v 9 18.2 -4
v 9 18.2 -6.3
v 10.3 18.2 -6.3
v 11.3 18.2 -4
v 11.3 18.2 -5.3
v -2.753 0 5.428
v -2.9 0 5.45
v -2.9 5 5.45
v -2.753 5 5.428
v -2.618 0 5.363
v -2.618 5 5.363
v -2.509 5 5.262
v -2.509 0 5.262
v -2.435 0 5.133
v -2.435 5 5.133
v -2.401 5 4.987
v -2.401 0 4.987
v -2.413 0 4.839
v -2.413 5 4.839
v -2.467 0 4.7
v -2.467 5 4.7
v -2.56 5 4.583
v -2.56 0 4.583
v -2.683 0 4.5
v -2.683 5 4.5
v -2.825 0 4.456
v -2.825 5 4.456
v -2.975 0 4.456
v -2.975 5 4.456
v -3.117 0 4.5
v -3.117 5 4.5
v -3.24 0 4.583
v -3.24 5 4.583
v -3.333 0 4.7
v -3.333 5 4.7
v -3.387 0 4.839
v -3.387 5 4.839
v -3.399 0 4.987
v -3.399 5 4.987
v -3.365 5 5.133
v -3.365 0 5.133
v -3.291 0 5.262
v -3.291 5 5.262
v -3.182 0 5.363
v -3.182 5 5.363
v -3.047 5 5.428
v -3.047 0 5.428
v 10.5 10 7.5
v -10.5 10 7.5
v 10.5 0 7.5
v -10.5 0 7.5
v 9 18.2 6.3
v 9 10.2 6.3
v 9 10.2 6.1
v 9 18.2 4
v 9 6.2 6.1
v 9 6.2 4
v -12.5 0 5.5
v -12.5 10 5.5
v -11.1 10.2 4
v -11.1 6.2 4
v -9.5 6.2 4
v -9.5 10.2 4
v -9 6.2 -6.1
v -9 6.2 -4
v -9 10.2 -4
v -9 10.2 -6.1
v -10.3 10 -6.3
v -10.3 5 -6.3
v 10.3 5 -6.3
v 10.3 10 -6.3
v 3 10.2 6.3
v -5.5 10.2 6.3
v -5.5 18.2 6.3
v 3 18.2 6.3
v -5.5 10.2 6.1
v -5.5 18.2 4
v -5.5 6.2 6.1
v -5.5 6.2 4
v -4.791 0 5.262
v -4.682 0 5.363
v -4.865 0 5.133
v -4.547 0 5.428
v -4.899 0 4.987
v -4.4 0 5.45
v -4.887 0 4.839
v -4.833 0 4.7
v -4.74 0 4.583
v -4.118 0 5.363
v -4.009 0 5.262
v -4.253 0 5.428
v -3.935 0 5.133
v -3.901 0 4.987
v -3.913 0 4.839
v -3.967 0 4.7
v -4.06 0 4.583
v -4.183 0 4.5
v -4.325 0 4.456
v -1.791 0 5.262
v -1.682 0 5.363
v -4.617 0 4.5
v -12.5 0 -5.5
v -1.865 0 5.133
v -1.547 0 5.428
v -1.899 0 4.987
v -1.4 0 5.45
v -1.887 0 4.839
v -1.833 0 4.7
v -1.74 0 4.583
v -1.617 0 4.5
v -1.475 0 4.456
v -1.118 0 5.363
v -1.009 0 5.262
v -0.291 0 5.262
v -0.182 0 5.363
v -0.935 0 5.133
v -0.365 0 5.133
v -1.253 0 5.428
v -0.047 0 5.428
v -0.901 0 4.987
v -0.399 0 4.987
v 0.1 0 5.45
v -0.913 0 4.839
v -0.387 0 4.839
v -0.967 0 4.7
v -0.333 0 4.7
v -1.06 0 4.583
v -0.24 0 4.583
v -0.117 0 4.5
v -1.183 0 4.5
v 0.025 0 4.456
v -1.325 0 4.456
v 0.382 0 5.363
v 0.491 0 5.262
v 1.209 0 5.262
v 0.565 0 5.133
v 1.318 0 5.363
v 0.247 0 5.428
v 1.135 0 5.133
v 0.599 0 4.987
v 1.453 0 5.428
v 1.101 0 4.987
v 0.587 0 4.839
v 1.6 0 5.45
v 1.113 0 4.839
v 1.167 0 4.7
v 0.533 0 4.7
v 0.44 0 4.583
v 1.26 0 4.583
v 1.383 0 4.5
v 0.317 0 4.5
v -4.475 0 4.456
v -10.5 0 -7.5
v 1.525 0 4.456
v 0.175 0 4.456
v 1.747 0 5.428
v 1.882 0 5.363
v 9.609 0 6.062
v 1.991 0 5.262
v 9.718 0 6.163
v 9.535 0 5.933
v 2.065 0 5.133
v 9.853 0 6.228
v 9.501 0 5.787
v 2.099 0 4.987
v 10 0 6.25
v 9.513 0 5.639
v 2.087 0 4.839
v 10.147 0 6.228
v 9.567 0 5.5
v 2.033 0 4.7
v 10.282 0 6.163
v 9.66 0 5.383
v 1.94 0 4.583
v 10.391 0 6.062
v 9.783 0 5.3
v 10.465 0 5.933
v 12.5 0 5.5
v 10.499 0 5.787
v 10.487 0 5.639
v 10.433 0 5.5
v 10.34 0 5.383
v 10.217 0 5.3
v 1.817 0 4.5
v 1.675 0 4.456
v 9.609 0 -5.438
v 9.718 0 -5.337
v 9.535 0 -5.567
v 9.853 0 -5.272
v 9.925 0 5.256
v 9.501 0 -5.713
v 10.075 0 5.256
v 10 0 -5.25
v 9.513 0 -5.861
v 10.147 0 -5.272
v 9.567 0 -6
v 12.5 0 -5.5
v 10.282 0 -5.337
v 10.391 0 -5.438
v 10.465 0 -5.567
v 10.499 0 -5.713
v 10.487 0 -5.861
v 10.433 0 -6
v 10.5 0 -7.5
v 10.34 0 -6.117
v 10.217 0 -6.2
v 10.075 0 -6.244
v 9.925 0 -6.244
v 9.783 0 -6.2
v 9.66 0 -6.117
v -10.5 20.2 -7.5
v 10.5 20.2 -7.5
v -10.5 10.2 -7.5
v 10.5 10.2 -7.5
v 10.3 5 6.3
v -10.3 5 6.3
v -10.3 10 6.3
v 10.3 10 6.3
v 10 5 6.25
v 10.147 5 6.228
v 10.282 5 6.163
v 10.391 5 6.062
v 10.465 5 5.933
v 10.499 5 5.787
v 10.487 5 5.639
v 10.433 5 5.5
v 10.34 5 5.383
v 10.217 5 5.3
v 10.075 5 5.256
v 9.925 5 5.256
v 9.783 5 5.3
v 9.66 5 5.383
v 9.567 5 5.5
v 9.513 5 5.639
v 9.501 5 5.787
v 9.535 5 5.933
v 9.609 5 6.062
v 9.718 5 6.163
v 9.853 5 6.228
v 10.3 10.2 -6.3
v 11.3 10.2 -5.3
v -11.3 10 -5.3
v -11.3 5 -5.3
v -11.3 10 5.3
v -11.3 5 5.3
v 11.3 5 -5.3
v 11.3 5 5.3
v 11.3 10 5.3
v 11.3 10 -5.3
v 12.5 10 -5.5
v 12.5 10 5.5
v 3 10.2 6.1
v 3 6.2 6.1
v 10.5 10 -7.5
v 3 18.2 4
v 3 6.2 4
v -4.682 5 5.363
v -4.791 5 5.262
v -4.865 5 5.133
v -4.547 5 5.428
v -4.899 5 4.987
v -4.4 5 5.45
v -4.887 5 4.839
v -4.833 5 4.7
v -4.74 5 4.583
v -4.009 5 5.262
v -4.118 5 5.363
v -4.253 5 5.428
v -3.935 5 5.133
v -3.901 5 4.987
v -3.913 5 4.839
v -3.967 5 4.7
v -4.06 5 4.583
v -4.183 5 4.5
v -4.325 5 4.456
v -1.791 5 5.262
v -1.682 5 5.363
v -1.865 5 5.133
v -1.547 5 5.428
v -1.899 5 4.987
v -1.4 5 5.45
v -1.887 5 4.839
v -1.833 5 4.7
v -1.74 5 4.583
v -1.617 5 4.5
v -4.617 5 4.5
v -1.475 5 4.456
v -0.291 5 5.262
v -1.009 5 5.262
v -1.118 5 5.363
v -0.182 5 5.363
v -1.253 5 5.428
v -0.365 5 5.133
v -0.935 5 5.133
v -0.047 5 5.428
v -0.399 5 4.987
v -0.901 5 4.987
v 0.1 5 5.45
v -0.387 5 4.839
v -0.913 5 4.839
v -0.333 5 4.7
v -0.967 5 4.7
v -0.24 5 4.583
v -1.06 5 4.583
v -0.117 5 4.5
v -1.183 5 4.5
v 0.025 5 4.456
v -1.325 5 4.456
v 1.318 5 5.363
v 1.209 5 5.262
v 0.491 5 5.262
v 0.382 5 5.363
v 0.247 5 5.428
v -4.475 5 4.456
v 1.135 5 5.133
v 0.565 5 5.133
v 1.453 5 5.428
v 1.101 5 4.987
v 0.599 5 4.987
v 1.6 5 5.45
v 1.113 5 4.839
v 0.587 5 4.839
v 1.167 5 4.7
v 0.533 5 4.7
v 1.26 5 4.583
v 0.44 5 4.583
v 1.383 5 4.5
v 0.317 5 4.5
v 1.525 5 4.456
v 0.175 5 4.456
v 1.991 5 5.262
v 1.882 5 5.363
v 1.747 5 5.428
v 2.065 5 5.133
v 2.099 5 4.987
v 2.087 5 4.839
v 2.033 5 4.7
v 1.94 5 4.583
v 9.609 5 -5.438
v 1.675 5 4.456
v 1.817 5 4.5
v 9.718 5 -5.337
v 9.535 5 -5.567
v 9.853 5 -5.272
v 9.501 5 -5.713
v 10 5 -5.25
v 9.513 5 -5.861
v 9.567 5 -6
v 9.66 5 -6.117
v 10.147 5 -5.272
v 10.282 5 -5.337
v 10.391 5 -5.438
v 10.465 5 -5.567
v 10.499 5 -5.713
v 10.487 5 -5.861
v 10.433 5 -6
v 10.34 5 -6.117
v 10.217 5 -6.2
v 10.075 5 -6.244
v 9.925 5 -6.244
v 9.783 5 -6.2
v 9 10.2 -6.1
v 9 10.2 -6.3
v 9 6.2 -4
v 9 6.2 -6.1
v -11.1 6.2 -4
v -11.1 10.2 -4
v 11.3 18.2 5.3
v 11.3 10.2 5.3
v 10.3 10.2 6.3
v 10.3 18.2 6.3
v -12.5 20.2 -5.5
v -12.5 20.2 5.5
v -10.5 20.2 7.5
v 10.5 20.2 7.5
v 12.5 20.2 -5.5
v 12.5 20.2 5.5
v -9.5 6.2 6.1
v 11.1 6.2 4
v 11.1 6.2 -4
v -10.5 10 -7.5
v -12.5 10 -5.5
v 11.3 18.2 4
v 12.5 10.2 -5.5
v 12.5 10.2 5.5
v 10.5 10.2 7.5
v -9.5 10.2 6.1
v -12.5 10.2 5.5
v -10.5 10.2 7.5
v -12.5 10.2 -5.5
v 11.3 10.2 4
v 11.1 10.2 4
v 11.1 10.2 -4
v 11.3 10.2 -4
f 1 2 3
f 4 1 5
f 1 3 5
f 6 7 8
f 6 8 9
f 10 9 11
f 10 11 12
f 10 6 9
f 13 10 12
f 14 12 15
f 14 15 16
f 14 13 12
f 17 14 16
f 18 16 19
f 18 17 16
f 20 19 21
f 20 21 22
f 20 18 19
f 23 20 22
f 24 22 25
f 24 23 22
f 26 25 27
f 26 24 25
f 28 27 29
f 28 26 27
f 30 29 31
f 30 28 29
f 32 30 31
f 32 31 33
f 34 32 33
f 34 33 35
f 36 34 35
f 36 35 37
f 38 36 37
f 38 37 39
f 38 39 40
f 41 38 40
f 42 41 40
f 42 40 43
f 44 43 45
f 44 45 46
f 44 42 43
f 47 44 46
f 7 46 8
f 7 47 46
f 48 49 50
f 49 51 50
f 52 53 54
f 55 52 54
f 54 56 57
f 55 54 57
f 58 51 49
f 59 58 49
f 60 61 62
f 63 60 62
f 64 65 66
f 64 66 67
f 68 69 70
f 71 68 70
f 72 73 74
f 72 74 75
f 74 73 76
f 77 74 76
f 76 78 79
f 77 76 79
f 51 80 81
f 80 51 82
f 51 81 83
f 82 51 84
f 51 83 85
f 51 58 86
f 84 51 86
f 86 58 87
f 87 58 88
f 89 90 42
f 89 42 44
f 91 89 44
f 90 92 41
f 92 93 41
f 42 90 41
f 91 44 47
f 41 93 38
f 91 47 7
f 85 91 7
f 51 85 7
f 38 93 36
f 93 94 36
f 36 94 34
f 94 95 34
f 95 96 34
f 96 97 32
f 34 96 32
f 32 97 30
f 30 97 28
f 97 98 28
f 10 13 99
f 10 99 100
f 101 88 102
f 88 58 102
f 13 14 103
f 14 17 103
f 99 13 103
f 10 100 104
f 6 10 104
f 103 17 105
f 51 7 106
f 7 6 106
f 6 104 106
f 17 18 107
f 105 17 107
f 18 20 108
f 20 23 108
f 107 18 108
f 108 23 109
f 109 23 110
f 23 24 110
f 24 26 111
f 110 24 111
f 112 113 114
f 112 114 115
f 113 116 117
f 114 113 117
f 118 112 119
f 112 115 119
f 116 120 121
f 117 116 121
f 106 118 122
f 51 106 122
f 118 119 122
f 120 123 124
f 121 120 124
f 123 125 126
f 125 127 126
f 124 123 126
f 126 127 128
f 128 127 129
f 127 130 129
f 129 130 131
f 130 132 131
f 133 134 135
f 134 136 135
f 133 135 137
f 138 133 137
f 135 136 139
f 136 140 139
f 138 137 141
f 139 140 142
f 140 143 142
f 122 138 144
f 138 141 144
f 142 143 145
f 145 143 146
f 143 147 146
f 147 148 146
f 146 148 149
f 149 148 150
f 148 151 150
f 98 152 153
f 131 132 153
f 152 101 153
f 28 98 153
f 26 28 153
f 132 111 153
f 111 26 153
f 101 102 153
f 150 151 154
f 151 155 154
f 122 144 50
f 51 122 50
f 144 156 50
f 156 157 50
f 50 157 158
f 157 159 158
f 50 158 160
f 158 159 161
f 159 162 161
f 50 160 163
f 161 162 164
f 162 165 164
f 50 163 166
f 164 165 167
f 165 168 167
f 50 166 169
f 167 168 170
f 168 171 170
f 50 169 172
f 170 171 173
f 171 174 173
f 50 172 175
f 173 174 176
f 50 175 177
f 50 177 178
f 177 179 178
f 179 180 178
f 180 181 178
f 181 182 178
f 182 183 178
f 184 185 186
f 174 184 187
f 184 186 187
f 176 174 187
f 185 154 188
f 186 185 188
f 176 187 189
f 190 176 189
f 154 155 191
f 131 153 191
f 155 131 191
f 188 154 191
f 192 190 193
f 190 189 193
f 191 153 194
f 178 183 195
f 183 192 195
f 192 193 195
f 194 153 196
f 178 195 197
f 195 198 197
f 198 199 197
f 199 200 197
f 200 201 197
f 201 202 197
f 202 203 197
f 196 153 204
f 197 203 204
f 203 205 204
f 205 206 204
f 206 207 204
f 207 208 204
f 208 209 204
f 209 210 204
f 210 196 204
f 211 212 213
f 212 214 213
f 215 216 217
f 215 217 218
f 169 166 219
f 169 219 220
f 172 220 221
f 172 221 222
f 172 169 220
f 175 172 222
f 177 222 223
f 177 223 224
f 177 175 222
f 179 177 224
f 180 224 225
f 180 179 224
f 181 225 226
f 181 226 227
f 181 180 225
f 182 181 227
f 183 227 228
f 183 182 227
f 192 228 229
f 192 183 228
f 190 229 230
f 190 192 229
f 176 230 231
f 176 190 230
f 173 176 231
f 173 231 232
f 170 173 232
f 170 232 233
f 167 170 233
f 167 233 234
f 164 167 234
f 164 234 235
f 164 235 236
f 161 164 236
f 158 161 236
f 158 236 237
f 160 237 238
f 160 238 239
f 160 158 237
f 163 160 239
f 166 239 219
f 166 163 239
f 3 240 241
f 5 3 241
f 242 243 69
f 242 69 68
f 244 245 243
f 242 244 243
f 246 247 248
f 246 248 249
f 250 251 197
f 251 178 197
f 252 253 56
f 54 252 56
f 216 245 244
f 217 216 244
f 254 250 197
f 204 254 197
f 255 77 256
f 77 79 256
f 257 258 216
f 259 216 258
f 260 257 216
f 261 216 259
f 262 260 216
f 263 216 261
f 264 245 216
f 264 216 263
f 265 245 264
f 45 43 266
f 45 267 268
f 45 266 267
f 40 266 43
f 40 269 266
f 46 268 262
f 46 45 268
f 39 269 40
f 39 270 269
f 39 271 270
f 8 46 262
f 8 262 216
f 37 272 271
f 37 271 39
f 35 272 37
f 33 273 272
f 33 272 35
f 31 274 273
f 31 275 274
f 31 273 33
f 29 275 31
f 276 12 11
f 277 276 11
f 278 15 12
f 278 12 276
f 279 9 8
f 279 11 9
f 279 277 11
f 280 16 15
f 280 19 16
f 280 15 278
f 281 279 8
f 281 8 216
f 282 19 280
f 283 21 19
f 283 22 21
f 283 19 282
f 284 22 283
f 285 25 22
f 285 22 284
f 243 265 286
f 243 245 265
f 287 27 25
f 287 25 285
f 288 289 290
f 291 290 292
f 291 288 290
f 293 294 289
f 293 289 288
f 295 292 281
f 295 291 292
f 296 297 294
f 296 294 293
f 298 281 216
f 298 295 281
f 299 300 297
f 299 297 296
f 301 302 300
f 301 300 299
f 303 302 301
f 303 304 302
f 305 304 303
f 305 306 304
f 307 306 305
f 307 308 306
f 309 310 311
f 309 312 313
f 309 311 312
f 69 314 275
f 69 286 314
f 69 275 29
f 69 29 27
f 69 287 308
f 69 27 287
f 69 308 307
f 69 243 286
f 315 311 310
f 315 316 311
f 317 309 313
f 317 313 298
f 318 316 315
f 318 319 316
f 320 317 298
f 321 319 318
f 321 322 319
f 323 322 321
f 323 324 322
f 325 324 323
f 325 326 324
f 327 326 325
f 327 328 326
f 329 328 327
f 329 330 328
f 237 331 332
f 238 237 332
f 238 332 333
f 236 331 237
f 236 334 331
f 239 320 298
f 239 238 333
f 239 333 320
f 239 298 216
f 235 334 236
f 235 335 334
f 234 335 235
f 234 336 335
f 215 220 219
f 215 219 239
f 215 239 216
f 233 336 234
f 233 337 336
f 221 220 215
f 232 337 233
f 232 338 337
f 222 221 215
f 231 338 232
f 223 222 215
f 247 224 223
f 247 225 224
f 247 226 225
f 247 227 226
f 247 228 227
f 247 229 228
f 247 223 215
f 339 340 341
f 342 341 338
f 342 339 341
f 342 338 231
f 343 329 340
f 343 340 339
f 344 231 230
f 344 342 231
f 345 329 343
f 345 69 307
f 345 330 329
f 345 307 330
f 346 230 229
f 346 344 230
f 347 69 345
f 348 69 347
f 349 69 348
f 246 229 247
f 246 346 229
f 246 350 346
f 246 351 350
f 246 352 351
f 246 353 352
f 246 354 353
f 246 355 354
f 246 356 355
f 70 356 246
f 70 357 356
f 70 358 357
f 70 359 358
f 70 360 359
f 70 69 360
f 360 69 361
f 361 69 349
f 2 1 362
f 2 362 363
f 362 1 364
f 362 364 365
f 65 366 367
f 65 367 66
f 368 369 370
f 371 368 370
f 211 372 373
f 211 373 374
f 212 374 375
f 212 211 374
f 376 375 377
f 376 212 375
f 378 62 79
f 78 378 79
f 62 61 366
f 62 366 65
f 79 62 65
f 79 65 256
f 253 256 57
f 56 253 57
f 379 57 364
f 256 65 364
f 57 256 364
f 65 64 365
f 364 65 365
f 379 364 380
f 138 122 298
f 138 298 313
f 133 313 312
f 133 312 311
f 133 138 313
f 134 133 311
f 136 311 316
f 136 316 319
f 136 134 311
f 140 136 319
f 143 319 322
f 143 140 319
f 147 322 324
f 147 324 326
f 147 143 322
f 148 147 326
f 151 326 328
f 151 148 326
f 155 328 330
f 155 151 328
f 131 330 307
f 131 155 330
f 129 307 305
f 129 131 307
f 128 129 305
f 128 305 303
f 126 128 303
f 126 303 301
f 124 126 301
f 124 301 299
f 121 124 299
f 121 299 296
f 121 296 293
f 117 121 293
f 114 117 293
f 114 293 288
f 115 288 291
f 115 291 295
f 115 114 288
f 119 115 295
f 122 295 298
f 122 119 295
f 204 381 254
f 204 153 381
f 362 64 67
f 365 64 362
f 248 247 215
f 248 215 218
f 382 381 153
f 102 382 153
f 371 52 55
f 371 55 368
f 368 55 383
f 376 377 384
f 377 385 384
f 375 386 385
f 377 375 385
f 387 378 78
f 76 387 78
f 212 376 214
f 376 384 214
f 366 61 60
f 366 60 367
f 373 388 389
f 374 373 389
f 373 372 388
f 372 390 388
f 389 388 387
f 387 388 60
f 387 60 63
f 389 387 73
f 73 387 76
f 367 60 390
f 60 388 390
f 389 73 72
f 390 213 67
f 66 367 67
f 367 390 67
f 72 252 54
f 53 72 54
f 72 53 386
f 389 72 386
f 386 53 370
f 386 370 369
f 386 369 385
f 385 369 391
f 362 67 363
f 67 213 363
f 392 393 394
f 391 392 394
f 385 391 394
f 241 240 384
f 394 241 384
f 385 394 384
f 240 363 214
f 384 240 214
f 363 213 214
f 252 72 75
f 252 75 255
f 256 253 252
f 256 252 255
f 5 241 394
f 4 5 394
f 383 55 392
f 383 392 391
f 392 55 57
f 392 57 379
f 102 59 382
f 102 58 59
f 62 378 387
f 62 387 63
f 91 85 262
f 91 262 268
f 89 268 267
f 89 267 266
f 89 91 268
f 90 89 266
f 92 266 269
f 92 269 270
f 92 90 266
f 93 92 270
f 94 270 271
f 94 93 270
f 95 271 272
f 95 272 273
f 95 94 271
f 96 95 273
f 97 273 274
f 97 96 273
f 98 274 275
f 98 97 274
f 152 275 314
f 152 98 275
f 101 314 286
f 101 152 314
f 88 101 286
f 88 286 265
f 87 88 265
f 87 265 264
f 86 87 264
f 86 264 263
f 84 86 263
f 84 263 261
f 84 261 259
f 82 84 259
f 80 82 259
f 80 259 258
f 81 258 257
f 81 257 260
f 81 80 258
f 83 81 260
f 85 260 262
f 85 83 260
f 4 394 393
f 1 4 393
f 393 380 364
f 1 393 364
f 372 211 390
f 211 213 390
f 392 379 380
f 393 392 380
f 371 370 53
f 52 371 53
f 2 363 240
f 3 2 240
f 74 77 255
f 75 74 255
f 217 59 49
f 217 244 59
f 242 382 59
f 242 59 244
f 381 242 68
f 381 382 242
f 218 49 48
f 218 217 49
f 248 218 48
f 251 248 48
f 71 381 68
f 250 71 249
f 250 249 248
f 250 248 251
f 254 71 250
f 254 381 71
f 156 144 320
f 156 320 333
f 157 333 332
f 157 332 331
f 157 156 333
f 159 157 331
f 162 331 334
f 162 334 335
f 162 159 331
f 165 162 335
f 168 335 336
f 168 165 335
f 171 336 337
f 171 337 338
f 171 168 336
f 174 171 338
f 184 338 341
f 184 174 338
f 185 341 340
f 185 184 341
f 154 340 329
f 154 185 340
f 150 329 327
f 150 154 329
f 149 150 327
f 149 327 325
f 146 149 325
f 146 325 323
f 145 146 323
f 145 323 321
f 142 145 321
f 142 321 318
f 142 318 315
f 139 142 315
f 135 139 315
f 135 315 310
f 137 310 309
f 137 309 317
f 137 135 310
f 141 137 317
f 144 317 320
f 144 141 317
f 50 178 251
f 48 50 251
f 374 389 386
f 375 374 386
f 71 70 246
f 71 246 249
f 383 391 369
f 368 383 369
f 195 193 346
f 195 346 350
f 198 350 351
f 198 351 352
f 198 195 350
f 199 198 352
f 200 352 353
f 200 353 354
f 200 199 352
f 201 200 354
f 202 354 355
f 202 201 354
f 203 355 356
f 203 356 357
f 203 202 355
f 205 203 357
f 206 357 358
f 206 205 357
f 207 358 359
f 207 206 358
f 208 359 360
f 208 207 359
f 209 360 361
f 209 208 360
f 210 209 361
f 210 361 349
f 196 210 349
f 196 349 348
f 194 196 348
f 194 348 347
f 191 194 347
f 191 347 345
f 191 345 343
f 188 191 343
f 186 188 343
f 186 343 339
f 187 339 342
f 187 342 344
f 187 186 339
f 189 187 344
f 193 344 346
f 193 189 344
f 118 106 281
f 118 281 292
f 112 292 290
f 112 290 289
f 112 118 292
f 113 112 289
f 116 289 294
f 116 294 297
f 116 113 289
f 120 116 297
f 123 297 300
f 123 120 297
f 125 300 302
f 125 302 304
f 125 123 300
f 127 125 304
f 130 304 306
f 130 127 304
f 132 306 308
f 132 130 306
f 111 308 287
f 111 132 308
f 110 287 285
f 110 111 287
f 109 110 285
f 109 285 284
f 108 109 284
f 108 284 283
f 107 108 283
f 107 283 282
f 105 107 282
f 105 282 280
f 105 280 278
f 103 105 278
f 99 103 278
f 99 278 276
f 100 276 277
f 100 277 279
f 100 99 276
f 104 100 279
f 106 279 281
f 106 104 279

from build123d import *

# Parameters (mm, degrees)
SKETCH2_W           = 25
SKETCH2_H           = 15
SKETCH2_R           = 0.5
BOSS_EXTRUDE1_DEPTH = 5
SKETCH3_W           = 25
SKETCH3_H           = 15
SKETCH3_W_2         = 22.6
SKETCH3_H_2         = 12.6
BOSS_EXTRUDE2_DEPTH = 5
CHAMFER1_SIZE       = 1
CHAMFER2_SIZE       = 2
BOSS_EXTRUDE3_START = 1.2
SKETCH4_W           = 18
SKETCH4_H           = 2.1
SKETCH4_W_2         = 22.2
SKETCH4_H_2         = 8
SKETCH4_W_3         = 4
SKETCH4_W_4         = 6
BOSS_EXTRUDE3_DEPTH = 4
SKETCH5_W           = 8.5
SKETCH5_H           = 2.3
BOSS_EXTRUDE4_DEPTH = 8
BOSS_EXTRUDE5_DEPTH = 2


with BuildPart() as part:
    # Sketch2 → Boss-Extrude1 (new body)
    with BuildSketch(Plane(origin=(0, 0, 0), x_dir=(1, 0, 0), z_dir=(0, 1, 0))):
        Rectangle(SKETCH2_W, SKETCH2_H)
        with Locations(Location((1.6, -4.95, 0), (0, 0, 270))):
            Circle(SKETCH2_R, mode=Mode.SUBTRACT)
        with Locations(Location((0.1, -4.95, 0), (0, 0, 270))):
            Circle(SKETCH2_R, mode=Mode.SUBTRACT)
        with Locations(Location((-1.4, -4.95, 0), (0, 0, 270))):
            Circle(SKETCH2_R, mode=Mode.SUBTRACT)
        with Locations(Location((-2.9, -4.95, 0), (0, 0, 270))):
            Circle(SKETCH2_R, mode=Mode.SUBTRACT)
        with Locations(Location((-4.4, -4.95, 0), (0, 0, 270))):
            Circle(SKETCH2_R, mode=Mode.SUBTRACT)
        with Locations(Location((10, -5.75, 0), (0, 0, 270))):
            Circle(SKETCH2_R, mode=Mode.SUBTRACT)
        with Locations(Location((10, 5.75, 0), (0, 0, 270))):
            Circle(SKETCH2_R, mode=Mode.SUBTRACT)
    extrude(amount=BOSS_EXTRUDE1_DEPTH)

    # Sketch3 → Boss-Extrude2 (add)
    with BuildSketch(Plane(origin=(0, 5, 0), x_dir=(1, 0, 0), z_dir=(0, 1, 0))):
        Rectangle(SKETCH3_W, SKETCH3_H)
        Rectangle(SKETCH3_W_2, SKETCH3_H_2, mode=Mode.SUBTRACT)
    extrude(amount=BOSS_EXTRUDE2_DEPTH)

    # Chamfer1
    chamfer1_edges = [part.edges().sort_by_distance(p)[0] for p in [
        (11.3, 7.5, 6.3),
        (11.3, 7.5, -6.3),
        (-11.3, 7.5, -6.3),
        (-11.3, 7.5, 6.3),
    ]]
    chamfer(chamfer1_edges, length=CHAMFER1_SIZE)

    # Chamfer2
    chamfer2_edges = [part.edges().sort_by_distance(p)[0] for p in [
        (12.5, 5, 7.5),
        (-12.5, 5, 7.5),
        (-12.5, 5, -7.5),
        (12.5, 5, -7.5),
    ]]
    chamfer(chamfer2_edges, length=CHAMFER2_SIZE)


with BuildPart() as body_2:
    # Sketch4 → Boss-Extrude3 (new body)
    with BuildSketch(Plane(origin=(0, 5, 0), x_dir=(1, 0, 0), z_dir=(0, 1, 0)).offset(BOSS_EXTRUDE3_START)):
        with Locations((0, 5.05)):
            Rectangle(SKETCH4_W, SKETCH4_H)
        Rectangle(SKETCH4_W_2, SKETCH4_H_2)
        with Locations((-7.5, -5.05)):
            Rectangle(SKETCH4_W_3, SKETCH4_H)
        with Locations((6, -5.05)):
            Rectangle(SKETCH4_W_4, SKETCH4_H)
    extrude(amount=BOSS_EXTRUDE3_DEPTH)

    # Sketch5 → Boss-Extrude4 (add)
    with BuildSketch(Plane(origin=(0, 10.2, 0), x_dir=(1, 0, 0), z_dir=(0, 1, 0))):
        Polygon((12.5, -5.5), (12.5, 5.5), (10.5, 7.5), (-10.5, 7.5), (-12.5, 5.5), (-12.5, -5.5), (-10.5, -7.5), (10.5, -7.5), align=None)
        Polygon((9, 4), (9, 6.3), (10.3, 6.3), (11.3, 5.3), (11.3, 4), align=None, mode=Mode.SUBTRACT)
        Polygon((9, -4), (11.3, -4), (11.3, -5.3), (10.3, -6.3), (9, -6.3), align=None, mode=Mode.SUBTRACT)
        with Locations((-1.25, -5.15)):
            Rectangle(SKETCH5_W, SKETCH5_H, mode=Mode.SUBTRACT)
    extrude(amount=BOSS_EXTRUDE4_DEPTH)

    # Sketch6 → Boss-Extrude5 (add)
    with BuildSketch(Plane(origin=(0, 18.2, 0), x_dir=(1, 0, 0), z_dir=(0, 1, 0))):
        Polygon((10.5, -7.5), (12.5, -5.5), (12.5, 5.5), (10.5, 7.5), (-10.5, 7.5), (-12.5, 5.5), (-12.5, -5.5), (-10.5, -7.5), align=None)
    extrude(amount=BOSS_EXTRUDE5_DEPTH)


solid = Compound([part.part, body_2.part])
